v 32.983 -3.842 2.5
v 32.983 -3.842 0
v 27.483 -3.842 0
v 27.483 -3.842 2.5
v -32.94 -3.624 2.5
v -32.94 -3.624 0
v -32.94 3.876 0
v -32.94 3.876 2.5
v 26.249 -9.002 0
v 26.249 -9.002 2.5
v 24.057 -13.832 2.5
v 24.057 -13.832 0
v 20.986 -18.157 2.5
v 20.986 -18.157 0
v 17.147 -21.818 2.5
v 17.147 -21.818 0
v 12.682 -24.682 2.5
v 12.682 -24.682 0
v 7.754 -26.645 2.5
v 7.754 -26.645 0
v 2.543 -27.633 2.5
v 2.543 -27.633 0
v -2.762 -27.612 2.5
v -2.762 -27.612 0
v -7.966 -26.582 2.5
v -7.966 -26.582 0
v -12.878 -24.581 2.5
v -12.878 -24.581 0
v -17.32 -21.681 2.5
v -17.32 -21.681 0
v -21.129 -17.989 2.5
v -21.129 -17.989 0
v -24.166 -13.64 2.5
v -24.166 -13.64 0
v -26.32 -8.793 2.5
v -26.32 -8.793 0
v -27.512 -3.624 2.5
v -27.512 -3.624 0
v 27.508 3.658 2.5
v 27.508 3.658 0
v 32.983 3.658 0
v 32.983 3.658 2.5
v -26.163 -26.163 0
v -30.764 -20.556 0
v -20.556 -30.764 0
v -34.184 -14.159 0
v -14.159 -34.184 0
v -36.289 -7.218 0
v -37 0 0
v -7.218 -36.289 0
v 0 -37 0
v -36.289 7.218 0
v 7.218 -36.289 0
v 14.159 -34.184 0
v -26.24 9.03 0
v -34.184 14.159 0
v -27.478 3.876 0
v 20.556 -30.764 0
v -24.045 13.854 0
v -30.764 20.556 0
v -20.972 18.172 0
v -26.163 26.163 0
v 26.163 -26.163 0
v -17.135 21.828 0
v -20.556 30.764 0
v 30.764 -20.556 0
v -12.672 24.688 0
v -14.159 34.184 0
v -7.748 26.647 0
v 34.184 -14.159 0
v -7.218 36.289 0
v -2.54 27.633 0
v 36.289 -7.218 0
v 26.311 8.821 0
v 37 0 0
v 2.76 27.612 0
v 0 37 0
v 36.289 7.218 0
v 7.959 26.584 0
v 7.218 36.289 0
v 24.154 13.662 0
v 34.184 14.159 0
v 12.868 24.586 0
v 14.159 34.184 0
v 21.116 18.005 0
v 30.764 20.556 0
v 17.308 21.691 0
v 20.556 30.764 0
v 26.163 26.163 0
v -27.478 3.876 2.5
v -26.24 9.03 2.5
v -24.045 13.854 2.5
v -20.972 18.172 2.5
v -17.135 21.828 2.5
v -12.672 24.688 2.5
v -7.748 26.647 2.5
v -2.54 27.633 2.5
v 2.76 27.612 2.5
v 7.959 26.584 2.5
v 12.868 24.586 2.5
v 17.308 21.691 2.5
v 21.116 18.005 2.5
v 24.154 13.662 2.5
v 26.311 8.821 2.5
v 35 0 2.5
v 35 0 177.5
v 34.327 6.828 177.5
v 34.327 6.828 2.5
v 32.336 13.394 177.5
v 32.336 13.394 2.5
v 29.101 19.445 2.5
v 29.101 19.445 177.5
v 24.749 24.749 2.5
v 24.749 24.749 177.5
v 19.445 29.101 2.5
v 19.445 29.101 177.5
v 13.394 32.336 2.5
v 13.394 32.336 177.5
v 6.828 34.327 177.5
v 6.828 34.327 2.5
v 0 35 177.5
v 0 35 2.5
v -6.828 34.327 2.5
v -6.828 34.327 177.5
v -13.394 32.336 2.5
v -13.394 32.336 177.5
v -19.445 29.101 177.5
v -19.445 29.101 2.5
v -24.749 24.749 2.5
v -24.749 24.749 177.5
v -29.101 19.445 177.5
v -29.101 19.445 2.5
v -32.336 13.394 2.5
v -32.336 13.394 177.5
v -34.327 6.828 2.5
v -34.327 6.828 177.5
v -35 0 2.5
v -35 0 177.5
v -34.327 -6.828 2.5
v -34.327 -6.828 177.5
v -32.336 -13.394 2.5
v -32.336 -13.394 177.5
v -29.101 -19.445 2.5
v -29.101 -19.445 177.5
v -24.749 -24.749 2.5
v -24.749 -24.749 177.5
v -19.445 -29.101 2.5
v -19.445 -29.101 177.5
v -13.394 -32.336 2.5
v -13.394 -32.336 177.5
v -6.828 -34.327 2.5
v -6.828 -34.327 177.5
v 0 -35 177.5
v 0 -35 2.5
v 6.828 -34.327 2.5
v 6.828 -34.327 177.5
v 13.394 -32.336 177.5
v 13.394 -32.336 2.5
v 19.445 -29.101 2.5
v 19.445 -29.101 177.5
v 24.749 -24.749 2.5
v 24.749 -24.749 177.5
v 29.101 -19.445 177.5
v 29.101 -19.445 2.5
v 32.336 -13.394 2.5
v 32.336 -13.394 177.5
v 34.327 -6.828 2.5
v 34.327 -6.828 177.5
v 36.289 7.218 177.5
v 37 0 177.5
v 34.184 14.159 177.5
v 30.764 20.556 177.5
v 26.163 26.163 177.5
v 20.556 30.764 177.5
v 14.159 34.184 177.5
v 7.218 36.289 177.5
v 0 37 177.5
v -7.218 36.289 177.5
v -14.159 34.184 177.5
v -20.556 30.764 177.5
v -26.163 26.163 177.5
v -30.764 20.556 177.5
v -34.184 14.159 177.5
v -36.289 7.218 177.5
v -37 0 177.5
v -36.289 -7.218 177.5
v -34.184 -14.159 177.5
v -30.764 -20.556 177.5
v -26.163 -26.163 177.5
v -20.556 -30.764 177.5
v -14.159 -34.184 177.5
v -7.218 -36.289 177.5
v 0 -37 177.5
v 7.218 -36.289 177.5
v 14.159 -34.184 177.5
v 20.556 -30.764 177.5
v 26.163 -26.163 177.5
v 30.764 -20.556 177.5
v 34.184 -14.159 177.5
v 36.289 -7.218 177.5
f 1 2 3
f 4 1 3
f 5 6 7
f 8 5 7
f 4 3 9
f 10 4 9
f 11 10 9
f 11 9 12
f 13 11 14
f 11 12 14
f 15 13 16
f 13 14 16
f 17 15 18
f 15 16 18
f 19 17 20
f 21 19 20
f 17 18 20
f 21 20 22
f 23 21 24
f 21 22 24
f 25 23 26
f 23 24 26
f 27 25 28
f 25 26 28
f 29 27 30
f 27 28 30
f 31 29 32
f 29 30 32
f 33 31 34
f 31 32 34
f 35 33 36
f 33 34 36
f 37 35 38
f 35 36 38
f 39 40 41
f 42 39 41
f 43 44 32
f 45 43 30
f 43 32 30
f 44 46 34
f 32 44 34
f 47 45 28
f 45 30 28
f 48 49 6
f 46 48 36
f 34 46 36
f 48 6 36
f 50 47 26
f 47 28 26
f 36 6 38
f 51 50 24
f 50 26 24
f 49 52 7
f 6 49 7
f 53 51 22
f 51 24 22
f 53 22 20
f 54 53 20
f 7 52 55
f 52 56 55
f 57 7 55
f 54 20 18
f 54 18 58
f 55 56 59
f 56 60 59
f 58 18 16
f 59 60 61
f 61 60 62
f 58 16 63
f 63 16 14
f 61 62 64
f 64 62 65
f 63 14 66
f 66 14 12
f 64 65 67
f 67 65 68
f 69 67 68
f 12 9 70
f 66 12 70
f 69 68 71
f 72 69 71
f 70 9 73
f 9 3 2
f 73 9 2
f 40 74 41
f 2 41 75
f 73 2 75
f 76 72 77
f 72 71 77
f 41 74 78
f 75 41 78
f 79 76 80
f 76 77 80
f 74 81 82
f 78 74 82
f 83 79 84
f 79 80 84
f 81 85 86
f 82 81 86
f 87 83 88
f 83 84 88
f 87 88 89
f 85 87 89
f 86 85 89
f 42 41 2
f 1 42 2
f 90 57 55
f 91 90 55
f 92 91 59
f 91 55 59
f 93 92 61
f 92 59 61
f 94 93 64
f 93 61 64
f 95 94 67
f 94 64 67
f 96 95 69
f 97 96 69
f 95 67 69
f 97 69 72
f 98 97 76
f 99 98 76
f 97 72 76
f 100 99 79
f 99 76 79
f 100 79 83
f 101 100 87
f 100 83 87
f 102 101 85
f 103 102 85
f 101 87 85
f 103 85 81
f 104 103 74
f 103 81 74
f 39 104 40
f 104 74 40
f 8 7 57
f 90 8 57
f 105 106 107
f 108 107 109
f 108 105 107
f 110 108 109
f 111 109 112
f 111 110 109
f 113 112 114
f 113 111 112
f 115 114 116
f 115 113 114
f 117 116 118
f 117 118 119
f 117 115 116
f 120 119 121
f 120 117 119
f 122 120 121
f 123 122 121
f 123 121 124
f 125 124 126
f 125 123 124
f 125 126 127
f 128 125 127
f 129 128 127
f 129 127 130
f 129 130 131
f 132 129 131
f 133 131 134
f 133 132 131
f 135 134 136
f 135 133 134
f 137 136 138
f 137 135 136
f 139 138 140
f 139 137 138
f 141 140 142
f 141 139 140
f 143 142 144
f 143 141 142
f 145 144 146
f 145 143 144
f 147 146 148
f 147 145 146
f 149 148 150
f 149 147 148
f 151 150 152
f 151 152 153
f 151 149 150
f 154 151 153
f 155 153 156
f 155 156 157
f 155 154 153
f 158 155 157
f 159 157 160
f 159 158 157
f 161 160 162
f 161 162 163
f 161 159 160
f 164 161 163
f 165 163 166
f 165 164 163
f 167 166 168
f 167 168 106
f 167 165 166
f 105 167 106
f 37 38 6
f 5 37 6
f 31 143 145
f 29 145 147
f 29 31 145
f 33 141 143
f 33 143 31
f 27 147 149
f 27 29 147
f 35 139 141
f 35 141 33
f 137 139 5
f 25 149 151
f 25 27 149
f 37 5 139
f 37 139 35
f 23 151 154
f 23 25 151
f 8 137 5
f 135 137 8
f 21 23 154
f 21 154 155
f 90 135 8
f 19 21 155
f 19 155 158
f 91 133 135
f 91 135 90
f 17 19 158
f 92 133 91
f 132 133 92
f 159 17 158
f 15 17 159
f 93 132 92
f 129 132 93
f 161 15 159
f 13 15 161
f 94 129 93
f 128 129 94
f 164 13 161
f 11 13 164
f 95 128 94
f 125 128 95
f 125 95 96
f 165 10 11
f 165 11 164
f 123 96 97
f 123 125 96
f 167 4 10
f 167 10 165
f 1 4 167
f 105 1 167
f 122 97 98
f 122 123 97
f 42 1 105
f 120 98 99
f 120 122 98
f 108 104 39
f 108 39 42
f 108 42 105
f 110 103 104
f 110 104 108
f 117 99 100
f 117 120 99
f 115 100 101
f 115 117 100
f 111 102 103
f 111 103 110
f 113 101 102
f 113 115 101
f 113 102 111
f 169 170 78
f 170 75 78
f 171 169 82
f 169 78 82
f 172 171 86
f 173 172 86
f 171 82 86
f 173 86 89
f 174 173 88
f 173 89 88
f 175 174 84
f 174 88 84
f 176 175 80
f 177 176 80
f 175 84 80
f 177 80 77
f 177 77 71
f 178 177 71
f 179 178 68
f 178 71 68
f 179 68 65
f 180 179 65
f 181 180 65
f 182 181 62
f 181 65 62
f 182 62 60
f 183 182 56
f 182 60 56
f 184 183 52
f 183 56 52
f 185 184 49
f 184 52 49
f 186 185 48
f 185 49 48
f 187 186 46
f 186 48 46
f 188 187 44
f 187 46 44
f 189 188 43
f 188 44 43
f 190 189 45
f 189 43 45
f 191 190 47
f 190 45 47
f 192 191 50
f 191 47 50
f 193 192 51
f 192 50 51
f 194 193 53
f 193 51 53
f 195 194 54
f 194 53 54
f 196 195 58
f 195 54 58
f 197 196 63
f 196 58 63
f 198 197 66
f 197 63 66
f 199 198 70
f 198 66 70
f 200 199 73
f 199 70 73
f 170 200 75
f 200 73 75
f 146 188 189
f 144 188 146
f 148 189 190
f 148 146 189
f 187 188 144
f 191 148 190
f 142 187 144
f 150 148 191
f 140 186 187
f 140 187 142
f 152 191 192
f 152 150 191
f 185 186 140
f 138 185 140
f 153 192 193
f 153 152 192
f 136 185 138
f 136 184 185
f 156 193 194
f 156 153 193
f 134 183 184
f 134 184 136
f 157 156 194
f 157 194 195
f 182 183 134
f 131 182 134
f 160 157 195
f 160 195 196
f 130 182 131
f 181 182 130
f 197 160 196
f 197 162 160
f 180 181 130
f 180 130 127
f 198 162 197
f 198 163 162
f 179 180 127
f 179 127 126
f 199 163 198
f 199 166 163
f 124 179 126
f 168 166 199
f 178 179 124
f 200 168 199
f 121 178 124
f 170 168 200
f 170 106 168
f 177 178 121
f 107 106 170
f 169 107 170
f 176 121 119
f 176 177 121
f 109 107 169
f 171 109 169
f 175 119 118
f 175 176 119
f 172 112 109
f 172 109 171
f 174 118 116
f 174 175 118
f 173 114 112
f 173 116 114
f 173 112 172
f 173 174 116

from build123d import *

# Parameters (mm, degrees)
F0_R     = 37
F1_DEPTH = 2.5
F2_R     = 37
F2_R_2   = 35
F3_DEPTH = 175


with BuildPart() as f1:
    # F0 (on Top) → F1 (new body)
    with BuildSketch(Plane.XY):
        Circle(F0_R)
        with BuildLine():
            Line((32.982701, -3.842347), (27.482701, -3.842347))
            ThreePointArc((27.482701, -3.842347), (-0.110238, -27.749781), (-27.512361, -3.623876))
            Line((-27.512361, -3.623876), (-32.939691, -3.623876))
            Line((-32.939691, -3.623876), (-32.939691, 3.876124))
            Line((-32.939691, 3.876124), (-27.477958, 3.876124))
            ThreePointArc((-27.477958, 3.876124), (0.110256, 27.749781), (27.507891, 3.657653))
            Line((27.507891, 3.657653), (32.982701, 3.657653))
            Line((32.982701, 3.657653), (32.982701, -3.842347))
        make_face(mode=Mode.SUBTRACT)
    extrude(amount=F1_DEPTH)

    # F2 (on face) → F3 (join)
    with BuildSketch(Plane.XY.offset(2.5)):
        Circle(F2_R)
        Circle(F2_R_2, mode=Mode.SUBTRACT)
    extrude(amount=F3_DEPTH)


solid = f1.part
